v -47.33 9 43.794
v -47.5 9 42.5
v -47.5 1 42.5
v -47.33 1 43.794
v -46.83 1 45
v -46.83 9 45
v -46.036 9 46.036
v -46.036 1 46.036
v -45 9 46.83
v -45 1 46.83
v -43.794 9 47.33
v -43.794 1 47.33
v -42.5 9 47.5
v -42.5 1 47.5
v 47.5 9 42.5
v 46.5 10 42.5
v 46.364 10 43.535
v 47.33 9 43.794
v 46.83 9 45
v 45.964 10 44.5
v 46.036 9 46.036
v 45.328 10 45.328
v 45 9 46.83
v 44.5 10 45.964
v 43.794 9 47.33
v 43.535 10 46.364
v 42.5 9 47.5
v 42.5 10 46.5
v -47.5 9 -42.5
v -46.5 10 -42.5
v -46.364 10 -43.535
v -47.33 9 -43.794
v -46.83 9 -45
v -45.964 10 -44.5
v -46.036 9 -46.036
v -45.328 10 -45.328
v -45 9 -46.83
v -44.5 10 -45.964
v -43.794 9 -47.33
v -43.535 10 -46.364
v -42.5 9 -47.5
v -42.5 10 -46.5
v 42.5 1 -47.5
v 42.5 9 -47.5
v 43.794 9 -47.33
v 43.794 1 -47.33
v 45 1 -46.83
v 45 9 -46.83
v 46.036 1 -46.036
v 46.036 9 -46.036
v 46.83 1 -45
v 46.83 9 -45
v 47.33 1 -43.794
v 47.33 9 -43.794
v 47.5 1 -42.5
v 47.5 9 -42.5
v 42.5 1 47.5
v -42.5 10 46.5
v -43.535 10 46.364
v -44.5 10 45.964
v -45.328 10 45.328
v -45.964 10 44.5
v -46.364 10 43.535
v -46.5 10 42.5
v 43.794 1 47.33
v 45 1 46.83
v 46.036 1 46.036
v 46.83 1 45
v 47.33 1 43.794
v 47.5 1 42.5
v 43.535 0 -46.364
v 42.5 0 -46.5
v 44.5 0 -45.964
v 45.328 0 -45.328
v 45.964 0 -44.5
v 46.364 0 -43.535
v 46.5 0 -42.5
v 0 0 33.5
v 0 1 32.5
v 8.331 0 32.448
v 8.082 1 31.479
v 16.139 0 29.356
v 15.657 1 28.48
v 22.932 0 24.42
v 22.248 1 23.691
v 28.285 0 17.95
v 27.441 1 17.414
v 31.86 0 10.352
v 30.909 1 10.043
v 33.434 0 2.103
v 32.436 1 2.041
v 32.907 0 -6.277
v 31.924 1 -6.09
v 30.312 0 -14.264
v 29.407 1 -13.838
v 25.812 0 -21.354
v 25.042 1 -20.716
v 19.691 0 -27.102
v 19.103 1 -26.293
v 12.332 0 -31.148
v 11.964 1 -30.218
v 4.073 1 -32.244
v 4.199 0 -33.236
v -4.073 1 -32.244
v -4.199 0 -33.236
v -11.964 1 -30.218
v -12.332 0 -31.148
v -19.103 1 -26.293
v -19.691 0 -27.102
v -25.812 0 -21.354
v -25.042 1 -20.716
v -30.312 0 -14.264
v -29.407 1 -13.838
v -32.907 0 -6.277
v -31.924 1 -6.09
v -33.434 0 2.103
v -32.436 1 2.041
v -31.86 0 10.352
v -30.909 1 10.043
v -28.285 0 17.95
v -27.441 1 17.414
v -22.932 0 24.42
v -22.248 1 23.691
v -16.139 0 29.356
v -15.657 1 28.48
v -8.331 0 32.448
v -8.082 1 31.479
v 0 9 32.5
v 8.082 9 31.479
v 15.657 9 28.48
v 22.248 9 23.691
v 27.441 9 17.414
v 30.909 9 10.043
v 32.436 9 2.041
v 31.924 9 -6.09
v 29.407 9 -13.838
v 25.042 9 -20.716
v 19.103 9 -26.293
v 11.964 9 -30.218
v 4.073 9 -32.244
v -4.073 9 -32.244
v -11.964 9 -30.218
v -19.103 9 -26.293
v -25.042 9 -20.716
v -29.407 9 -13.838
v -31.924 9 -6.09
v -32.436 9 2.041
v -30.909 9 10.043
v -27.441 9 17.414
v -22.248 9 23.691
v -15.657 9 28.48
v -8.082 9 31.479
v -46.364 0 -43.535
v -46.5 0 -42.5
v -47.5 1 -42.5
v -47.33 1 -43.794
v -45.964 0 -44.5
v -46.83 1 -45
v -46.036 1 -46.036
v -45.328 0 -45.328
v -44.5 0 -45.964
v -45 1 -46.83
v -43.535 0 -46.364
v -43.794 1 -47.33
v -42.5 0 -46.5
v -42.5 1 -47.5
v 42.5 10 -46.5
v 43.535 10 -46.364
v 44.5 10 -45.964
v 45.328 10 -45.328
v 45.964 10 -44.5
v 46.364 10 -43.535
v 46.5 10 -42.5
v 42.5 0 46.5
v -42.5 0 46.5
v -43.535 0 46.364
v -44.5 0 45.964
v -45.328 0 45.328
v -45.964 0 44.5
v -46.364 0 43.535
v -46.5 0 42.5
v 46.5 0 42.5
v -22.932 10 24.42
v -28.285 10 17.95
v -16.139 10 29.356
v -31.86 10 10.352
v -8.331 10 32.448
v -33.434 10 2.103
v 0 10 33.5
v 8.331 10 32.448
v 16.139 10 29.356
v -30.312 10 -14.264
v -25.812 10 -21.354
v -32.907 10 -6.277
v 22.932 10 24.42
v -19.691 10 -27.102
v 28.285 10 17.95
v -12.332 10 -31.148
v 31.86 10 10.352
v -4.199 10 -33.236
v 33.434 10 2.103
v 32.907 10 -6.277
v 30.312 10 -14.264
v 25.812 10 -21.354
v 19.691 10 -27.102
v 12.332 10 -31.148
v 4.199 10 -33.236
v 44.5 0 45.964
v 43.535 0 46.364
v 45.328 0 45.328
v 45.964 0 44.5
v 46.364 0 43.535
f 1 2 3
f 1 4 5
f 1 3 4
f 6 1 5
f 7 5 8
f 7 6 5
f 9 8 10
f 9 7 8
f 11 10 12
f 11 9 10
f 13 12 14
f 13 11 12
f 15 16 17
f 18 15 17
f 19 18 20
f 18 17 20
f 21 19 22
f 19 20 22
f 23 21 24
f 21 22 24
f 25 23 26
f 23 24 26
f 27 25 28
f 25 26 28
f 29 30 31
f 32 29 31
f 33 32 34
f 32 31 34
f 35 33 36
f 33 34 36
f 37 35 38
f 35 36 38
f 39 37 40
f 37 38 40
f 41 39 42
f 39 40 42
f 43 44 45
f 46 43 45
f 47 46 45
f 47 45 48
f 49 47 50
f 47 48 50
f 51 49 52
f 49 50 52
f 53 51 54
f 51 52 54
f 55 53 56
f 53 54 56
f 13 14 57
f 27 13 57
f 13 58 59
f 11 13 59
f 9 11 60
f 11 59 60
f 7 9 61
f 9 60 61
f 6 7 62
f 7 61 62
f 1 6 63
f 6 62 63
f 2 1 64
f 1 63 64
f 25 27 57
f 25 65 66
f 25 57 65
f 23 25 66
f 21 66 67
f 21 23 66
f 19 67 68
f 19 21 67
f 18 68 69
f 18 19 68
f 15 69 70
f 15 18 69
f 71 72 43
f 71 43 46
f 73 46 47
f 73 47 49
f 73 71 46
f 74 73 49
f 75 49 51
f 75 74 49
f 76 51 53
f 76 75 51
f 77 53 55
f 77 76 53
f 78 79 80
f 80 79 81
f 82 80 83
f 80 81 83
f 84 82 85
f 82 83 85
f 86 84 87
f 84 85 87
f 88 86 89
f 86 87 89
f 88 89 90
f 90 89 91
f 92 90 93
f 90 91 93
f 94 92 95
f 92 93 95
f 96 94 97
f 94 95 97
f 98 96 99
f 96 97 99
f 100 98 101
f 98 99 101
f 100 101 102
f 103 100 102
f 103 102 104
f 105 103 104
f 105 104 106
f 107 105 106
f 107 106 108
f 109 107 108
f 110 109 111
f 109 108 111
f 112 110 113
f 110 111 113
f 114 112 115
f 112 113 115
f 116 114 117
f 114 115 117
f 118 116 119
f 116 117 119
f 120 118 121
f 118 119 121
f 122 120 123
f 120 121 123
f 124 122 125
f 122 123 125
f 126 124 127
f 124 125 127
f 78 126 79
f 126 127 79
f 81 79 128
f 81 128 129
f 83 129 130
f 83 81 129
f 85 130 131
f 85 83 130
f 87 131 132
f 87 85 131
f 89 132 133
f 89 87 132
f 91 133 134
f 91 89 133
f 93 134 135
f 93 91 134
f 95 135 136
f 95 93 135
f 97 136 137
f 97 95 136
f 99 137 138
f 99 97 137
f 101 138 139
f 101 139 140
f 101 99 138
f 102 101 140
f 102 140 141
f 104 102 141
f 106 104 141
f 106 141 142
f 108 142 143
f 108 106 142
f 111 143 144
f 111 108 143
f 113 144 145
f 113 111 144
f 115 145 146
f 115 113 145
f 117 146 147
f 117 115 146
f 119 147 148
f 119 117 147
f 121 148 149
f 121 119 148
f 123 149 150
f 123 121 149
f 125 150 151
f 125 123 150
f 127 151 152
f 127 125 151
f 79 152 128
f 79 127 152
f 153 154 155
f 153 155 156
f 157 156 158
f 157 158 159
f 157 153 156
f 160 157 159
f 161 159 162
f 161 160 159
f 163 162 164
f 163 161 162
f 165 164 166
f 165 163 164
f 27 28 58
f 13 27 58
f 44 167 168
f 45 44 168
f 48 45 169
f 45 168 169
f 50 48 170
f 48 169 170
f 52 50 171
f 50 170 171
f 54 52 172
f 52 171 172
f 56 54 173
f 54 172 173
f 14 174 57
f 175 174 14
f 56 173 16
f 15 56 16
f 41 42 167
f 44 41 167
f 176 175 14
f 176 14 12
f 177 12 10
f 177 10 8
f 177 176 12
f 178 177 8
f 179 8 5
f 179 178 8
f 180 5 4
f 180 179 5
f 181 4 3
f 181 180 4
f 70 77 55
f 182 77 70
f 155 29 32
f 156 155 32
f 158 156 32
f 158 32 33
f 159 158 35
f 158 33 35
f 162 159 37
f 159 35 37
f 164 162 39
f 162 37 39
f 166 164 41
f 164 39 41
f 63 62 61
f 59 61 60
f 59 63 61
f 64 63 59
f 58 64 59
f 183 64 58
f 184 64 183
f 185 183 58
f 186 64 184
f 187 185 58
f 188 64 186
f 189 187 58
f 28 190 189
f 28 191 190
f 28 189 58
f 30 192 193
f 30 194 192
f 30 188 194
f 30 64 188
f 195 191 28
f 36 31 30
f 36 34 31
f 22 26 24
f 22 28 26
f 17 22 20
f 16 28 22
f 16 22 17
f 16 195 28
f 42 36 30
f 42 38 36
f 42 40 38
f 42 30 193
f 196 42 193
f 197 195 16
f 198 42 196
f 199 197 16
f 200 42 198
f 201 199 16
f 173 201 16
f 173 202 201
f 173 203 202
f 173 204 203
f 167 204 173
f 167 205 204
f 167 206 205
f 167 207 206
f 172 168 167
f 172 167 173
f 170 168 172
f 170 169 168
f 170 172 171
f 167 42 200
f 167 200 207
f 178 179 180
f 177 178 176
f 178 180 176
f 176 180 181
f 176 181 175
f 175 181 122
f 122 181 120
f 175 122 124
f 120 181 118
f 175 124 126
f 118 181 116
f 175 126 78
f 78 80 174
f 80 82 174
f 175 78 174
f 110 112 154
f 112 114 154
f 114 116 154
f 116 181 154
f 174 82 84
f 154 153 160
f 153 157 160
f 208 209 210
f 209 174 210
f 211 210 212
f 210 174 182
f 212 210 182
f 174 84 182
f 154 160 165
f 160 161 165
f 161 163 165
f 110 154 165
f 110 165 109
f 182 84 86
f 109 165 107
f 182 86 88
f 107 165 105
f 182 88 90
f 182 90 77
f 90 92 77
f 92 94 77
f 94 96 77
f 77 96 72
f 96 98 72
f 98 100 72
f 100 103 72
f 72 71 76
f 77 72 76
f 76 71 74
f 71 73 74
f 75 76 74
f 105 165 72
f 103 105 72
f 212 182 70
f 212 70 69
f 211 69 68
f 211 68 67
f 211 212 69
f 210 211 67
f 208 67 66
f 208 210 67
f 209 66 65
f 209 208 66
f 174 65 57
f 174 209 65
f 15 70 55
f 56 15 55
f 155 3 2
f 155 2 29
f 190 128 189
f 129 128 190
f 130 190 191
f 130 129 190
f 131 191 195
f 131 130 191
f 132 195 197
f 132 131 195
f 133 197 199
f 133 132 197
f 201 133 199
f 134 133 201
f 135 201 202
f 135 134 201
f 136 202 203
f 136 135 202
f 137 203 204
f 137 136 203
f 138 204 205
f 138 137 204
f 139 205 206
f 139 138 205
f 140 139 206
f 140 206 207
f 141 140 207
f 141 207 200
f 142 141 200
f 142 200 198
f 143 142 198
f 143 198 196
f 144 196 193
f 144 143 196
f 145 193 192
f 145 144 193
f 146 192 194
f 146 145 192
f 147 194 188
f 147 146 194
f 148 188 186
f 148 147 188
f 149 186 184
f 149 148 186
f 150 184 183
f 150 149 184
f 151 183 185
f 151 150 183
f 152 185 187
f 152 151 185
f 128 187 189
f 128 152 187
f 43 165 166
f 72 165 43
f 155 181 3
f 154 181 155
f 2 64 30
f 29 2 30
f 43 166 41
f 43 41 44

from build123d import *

# Parameters (mm, degrees)
SKETCH1_W           = 95
SKETCH1_H           = 95
SKETCH1_R           = 32.5
BOSS_EXTRUDE1_DEPTH = 10
FILLET1_R           = 5
CHAMFER1_SIZE       = 1


with BuildPart() as part:
    # Sketch1 → Boss-Extrude1 (new body)
    with BuildSketch(Plane(origin=(0, 0, 0), x_dir=(1, 0, 0), z_dir=(0, 1, 0))):
        Rectangle(SKETCH1_W, SKETCH1_H)
        with Locations(Location((0, 0, 0), (0, 0, 270))):
            Circle(SKETCH1_R, mode=Mode.SUBTRACT)
    extrude(amount=BOSS_EXTRUDE1_DEPTH)

    # Fillet1
    fillet1_edges = [part.edges().sort_by_distance(p)[0] for p in [
        (47.5, 5, 47.5),
        (-47.5, 5, 47.5),
        (-47.5, 5, -47.5),
        (47.5, 5, -47.5),
    ]]
    fillet(fillet1_edges, radius=FILLET1_R)

    # Chamfer1
    chamfer1_edges = [part.edges().sort_by_distance(p)[0] for p in [
        (0, 0, -32.5),
        (0, 10, -32.5),
        (-47.5, 0, 0),
        (-47.5, 10, 0),
        (47.5, 0, 0),
        (0, 0, 47.5),
        (0, 0, -47.5),
        (-46.035533906, 0, 46.035533906),
        (46.035533906, 0, 46.035533906),
        (46.035533906, 0, -46.035533906),
        (-46.035533906, 0, -46.035533906),
        (0, 10, -47.5),
        (47.5, 10, 0),
        (0, 10, 47.5),
        (-46.035533906, 10, 46.035533906),
        (46.035533906, 10, 46.035533906),
        (46.035533906, 10, -46.035533906),
        (-46.035533906, 10, -46.035533906),
    ]]
    chamfer(chamfer1_edges, length=CHAMFER1_SIZE)


solid = part.part
